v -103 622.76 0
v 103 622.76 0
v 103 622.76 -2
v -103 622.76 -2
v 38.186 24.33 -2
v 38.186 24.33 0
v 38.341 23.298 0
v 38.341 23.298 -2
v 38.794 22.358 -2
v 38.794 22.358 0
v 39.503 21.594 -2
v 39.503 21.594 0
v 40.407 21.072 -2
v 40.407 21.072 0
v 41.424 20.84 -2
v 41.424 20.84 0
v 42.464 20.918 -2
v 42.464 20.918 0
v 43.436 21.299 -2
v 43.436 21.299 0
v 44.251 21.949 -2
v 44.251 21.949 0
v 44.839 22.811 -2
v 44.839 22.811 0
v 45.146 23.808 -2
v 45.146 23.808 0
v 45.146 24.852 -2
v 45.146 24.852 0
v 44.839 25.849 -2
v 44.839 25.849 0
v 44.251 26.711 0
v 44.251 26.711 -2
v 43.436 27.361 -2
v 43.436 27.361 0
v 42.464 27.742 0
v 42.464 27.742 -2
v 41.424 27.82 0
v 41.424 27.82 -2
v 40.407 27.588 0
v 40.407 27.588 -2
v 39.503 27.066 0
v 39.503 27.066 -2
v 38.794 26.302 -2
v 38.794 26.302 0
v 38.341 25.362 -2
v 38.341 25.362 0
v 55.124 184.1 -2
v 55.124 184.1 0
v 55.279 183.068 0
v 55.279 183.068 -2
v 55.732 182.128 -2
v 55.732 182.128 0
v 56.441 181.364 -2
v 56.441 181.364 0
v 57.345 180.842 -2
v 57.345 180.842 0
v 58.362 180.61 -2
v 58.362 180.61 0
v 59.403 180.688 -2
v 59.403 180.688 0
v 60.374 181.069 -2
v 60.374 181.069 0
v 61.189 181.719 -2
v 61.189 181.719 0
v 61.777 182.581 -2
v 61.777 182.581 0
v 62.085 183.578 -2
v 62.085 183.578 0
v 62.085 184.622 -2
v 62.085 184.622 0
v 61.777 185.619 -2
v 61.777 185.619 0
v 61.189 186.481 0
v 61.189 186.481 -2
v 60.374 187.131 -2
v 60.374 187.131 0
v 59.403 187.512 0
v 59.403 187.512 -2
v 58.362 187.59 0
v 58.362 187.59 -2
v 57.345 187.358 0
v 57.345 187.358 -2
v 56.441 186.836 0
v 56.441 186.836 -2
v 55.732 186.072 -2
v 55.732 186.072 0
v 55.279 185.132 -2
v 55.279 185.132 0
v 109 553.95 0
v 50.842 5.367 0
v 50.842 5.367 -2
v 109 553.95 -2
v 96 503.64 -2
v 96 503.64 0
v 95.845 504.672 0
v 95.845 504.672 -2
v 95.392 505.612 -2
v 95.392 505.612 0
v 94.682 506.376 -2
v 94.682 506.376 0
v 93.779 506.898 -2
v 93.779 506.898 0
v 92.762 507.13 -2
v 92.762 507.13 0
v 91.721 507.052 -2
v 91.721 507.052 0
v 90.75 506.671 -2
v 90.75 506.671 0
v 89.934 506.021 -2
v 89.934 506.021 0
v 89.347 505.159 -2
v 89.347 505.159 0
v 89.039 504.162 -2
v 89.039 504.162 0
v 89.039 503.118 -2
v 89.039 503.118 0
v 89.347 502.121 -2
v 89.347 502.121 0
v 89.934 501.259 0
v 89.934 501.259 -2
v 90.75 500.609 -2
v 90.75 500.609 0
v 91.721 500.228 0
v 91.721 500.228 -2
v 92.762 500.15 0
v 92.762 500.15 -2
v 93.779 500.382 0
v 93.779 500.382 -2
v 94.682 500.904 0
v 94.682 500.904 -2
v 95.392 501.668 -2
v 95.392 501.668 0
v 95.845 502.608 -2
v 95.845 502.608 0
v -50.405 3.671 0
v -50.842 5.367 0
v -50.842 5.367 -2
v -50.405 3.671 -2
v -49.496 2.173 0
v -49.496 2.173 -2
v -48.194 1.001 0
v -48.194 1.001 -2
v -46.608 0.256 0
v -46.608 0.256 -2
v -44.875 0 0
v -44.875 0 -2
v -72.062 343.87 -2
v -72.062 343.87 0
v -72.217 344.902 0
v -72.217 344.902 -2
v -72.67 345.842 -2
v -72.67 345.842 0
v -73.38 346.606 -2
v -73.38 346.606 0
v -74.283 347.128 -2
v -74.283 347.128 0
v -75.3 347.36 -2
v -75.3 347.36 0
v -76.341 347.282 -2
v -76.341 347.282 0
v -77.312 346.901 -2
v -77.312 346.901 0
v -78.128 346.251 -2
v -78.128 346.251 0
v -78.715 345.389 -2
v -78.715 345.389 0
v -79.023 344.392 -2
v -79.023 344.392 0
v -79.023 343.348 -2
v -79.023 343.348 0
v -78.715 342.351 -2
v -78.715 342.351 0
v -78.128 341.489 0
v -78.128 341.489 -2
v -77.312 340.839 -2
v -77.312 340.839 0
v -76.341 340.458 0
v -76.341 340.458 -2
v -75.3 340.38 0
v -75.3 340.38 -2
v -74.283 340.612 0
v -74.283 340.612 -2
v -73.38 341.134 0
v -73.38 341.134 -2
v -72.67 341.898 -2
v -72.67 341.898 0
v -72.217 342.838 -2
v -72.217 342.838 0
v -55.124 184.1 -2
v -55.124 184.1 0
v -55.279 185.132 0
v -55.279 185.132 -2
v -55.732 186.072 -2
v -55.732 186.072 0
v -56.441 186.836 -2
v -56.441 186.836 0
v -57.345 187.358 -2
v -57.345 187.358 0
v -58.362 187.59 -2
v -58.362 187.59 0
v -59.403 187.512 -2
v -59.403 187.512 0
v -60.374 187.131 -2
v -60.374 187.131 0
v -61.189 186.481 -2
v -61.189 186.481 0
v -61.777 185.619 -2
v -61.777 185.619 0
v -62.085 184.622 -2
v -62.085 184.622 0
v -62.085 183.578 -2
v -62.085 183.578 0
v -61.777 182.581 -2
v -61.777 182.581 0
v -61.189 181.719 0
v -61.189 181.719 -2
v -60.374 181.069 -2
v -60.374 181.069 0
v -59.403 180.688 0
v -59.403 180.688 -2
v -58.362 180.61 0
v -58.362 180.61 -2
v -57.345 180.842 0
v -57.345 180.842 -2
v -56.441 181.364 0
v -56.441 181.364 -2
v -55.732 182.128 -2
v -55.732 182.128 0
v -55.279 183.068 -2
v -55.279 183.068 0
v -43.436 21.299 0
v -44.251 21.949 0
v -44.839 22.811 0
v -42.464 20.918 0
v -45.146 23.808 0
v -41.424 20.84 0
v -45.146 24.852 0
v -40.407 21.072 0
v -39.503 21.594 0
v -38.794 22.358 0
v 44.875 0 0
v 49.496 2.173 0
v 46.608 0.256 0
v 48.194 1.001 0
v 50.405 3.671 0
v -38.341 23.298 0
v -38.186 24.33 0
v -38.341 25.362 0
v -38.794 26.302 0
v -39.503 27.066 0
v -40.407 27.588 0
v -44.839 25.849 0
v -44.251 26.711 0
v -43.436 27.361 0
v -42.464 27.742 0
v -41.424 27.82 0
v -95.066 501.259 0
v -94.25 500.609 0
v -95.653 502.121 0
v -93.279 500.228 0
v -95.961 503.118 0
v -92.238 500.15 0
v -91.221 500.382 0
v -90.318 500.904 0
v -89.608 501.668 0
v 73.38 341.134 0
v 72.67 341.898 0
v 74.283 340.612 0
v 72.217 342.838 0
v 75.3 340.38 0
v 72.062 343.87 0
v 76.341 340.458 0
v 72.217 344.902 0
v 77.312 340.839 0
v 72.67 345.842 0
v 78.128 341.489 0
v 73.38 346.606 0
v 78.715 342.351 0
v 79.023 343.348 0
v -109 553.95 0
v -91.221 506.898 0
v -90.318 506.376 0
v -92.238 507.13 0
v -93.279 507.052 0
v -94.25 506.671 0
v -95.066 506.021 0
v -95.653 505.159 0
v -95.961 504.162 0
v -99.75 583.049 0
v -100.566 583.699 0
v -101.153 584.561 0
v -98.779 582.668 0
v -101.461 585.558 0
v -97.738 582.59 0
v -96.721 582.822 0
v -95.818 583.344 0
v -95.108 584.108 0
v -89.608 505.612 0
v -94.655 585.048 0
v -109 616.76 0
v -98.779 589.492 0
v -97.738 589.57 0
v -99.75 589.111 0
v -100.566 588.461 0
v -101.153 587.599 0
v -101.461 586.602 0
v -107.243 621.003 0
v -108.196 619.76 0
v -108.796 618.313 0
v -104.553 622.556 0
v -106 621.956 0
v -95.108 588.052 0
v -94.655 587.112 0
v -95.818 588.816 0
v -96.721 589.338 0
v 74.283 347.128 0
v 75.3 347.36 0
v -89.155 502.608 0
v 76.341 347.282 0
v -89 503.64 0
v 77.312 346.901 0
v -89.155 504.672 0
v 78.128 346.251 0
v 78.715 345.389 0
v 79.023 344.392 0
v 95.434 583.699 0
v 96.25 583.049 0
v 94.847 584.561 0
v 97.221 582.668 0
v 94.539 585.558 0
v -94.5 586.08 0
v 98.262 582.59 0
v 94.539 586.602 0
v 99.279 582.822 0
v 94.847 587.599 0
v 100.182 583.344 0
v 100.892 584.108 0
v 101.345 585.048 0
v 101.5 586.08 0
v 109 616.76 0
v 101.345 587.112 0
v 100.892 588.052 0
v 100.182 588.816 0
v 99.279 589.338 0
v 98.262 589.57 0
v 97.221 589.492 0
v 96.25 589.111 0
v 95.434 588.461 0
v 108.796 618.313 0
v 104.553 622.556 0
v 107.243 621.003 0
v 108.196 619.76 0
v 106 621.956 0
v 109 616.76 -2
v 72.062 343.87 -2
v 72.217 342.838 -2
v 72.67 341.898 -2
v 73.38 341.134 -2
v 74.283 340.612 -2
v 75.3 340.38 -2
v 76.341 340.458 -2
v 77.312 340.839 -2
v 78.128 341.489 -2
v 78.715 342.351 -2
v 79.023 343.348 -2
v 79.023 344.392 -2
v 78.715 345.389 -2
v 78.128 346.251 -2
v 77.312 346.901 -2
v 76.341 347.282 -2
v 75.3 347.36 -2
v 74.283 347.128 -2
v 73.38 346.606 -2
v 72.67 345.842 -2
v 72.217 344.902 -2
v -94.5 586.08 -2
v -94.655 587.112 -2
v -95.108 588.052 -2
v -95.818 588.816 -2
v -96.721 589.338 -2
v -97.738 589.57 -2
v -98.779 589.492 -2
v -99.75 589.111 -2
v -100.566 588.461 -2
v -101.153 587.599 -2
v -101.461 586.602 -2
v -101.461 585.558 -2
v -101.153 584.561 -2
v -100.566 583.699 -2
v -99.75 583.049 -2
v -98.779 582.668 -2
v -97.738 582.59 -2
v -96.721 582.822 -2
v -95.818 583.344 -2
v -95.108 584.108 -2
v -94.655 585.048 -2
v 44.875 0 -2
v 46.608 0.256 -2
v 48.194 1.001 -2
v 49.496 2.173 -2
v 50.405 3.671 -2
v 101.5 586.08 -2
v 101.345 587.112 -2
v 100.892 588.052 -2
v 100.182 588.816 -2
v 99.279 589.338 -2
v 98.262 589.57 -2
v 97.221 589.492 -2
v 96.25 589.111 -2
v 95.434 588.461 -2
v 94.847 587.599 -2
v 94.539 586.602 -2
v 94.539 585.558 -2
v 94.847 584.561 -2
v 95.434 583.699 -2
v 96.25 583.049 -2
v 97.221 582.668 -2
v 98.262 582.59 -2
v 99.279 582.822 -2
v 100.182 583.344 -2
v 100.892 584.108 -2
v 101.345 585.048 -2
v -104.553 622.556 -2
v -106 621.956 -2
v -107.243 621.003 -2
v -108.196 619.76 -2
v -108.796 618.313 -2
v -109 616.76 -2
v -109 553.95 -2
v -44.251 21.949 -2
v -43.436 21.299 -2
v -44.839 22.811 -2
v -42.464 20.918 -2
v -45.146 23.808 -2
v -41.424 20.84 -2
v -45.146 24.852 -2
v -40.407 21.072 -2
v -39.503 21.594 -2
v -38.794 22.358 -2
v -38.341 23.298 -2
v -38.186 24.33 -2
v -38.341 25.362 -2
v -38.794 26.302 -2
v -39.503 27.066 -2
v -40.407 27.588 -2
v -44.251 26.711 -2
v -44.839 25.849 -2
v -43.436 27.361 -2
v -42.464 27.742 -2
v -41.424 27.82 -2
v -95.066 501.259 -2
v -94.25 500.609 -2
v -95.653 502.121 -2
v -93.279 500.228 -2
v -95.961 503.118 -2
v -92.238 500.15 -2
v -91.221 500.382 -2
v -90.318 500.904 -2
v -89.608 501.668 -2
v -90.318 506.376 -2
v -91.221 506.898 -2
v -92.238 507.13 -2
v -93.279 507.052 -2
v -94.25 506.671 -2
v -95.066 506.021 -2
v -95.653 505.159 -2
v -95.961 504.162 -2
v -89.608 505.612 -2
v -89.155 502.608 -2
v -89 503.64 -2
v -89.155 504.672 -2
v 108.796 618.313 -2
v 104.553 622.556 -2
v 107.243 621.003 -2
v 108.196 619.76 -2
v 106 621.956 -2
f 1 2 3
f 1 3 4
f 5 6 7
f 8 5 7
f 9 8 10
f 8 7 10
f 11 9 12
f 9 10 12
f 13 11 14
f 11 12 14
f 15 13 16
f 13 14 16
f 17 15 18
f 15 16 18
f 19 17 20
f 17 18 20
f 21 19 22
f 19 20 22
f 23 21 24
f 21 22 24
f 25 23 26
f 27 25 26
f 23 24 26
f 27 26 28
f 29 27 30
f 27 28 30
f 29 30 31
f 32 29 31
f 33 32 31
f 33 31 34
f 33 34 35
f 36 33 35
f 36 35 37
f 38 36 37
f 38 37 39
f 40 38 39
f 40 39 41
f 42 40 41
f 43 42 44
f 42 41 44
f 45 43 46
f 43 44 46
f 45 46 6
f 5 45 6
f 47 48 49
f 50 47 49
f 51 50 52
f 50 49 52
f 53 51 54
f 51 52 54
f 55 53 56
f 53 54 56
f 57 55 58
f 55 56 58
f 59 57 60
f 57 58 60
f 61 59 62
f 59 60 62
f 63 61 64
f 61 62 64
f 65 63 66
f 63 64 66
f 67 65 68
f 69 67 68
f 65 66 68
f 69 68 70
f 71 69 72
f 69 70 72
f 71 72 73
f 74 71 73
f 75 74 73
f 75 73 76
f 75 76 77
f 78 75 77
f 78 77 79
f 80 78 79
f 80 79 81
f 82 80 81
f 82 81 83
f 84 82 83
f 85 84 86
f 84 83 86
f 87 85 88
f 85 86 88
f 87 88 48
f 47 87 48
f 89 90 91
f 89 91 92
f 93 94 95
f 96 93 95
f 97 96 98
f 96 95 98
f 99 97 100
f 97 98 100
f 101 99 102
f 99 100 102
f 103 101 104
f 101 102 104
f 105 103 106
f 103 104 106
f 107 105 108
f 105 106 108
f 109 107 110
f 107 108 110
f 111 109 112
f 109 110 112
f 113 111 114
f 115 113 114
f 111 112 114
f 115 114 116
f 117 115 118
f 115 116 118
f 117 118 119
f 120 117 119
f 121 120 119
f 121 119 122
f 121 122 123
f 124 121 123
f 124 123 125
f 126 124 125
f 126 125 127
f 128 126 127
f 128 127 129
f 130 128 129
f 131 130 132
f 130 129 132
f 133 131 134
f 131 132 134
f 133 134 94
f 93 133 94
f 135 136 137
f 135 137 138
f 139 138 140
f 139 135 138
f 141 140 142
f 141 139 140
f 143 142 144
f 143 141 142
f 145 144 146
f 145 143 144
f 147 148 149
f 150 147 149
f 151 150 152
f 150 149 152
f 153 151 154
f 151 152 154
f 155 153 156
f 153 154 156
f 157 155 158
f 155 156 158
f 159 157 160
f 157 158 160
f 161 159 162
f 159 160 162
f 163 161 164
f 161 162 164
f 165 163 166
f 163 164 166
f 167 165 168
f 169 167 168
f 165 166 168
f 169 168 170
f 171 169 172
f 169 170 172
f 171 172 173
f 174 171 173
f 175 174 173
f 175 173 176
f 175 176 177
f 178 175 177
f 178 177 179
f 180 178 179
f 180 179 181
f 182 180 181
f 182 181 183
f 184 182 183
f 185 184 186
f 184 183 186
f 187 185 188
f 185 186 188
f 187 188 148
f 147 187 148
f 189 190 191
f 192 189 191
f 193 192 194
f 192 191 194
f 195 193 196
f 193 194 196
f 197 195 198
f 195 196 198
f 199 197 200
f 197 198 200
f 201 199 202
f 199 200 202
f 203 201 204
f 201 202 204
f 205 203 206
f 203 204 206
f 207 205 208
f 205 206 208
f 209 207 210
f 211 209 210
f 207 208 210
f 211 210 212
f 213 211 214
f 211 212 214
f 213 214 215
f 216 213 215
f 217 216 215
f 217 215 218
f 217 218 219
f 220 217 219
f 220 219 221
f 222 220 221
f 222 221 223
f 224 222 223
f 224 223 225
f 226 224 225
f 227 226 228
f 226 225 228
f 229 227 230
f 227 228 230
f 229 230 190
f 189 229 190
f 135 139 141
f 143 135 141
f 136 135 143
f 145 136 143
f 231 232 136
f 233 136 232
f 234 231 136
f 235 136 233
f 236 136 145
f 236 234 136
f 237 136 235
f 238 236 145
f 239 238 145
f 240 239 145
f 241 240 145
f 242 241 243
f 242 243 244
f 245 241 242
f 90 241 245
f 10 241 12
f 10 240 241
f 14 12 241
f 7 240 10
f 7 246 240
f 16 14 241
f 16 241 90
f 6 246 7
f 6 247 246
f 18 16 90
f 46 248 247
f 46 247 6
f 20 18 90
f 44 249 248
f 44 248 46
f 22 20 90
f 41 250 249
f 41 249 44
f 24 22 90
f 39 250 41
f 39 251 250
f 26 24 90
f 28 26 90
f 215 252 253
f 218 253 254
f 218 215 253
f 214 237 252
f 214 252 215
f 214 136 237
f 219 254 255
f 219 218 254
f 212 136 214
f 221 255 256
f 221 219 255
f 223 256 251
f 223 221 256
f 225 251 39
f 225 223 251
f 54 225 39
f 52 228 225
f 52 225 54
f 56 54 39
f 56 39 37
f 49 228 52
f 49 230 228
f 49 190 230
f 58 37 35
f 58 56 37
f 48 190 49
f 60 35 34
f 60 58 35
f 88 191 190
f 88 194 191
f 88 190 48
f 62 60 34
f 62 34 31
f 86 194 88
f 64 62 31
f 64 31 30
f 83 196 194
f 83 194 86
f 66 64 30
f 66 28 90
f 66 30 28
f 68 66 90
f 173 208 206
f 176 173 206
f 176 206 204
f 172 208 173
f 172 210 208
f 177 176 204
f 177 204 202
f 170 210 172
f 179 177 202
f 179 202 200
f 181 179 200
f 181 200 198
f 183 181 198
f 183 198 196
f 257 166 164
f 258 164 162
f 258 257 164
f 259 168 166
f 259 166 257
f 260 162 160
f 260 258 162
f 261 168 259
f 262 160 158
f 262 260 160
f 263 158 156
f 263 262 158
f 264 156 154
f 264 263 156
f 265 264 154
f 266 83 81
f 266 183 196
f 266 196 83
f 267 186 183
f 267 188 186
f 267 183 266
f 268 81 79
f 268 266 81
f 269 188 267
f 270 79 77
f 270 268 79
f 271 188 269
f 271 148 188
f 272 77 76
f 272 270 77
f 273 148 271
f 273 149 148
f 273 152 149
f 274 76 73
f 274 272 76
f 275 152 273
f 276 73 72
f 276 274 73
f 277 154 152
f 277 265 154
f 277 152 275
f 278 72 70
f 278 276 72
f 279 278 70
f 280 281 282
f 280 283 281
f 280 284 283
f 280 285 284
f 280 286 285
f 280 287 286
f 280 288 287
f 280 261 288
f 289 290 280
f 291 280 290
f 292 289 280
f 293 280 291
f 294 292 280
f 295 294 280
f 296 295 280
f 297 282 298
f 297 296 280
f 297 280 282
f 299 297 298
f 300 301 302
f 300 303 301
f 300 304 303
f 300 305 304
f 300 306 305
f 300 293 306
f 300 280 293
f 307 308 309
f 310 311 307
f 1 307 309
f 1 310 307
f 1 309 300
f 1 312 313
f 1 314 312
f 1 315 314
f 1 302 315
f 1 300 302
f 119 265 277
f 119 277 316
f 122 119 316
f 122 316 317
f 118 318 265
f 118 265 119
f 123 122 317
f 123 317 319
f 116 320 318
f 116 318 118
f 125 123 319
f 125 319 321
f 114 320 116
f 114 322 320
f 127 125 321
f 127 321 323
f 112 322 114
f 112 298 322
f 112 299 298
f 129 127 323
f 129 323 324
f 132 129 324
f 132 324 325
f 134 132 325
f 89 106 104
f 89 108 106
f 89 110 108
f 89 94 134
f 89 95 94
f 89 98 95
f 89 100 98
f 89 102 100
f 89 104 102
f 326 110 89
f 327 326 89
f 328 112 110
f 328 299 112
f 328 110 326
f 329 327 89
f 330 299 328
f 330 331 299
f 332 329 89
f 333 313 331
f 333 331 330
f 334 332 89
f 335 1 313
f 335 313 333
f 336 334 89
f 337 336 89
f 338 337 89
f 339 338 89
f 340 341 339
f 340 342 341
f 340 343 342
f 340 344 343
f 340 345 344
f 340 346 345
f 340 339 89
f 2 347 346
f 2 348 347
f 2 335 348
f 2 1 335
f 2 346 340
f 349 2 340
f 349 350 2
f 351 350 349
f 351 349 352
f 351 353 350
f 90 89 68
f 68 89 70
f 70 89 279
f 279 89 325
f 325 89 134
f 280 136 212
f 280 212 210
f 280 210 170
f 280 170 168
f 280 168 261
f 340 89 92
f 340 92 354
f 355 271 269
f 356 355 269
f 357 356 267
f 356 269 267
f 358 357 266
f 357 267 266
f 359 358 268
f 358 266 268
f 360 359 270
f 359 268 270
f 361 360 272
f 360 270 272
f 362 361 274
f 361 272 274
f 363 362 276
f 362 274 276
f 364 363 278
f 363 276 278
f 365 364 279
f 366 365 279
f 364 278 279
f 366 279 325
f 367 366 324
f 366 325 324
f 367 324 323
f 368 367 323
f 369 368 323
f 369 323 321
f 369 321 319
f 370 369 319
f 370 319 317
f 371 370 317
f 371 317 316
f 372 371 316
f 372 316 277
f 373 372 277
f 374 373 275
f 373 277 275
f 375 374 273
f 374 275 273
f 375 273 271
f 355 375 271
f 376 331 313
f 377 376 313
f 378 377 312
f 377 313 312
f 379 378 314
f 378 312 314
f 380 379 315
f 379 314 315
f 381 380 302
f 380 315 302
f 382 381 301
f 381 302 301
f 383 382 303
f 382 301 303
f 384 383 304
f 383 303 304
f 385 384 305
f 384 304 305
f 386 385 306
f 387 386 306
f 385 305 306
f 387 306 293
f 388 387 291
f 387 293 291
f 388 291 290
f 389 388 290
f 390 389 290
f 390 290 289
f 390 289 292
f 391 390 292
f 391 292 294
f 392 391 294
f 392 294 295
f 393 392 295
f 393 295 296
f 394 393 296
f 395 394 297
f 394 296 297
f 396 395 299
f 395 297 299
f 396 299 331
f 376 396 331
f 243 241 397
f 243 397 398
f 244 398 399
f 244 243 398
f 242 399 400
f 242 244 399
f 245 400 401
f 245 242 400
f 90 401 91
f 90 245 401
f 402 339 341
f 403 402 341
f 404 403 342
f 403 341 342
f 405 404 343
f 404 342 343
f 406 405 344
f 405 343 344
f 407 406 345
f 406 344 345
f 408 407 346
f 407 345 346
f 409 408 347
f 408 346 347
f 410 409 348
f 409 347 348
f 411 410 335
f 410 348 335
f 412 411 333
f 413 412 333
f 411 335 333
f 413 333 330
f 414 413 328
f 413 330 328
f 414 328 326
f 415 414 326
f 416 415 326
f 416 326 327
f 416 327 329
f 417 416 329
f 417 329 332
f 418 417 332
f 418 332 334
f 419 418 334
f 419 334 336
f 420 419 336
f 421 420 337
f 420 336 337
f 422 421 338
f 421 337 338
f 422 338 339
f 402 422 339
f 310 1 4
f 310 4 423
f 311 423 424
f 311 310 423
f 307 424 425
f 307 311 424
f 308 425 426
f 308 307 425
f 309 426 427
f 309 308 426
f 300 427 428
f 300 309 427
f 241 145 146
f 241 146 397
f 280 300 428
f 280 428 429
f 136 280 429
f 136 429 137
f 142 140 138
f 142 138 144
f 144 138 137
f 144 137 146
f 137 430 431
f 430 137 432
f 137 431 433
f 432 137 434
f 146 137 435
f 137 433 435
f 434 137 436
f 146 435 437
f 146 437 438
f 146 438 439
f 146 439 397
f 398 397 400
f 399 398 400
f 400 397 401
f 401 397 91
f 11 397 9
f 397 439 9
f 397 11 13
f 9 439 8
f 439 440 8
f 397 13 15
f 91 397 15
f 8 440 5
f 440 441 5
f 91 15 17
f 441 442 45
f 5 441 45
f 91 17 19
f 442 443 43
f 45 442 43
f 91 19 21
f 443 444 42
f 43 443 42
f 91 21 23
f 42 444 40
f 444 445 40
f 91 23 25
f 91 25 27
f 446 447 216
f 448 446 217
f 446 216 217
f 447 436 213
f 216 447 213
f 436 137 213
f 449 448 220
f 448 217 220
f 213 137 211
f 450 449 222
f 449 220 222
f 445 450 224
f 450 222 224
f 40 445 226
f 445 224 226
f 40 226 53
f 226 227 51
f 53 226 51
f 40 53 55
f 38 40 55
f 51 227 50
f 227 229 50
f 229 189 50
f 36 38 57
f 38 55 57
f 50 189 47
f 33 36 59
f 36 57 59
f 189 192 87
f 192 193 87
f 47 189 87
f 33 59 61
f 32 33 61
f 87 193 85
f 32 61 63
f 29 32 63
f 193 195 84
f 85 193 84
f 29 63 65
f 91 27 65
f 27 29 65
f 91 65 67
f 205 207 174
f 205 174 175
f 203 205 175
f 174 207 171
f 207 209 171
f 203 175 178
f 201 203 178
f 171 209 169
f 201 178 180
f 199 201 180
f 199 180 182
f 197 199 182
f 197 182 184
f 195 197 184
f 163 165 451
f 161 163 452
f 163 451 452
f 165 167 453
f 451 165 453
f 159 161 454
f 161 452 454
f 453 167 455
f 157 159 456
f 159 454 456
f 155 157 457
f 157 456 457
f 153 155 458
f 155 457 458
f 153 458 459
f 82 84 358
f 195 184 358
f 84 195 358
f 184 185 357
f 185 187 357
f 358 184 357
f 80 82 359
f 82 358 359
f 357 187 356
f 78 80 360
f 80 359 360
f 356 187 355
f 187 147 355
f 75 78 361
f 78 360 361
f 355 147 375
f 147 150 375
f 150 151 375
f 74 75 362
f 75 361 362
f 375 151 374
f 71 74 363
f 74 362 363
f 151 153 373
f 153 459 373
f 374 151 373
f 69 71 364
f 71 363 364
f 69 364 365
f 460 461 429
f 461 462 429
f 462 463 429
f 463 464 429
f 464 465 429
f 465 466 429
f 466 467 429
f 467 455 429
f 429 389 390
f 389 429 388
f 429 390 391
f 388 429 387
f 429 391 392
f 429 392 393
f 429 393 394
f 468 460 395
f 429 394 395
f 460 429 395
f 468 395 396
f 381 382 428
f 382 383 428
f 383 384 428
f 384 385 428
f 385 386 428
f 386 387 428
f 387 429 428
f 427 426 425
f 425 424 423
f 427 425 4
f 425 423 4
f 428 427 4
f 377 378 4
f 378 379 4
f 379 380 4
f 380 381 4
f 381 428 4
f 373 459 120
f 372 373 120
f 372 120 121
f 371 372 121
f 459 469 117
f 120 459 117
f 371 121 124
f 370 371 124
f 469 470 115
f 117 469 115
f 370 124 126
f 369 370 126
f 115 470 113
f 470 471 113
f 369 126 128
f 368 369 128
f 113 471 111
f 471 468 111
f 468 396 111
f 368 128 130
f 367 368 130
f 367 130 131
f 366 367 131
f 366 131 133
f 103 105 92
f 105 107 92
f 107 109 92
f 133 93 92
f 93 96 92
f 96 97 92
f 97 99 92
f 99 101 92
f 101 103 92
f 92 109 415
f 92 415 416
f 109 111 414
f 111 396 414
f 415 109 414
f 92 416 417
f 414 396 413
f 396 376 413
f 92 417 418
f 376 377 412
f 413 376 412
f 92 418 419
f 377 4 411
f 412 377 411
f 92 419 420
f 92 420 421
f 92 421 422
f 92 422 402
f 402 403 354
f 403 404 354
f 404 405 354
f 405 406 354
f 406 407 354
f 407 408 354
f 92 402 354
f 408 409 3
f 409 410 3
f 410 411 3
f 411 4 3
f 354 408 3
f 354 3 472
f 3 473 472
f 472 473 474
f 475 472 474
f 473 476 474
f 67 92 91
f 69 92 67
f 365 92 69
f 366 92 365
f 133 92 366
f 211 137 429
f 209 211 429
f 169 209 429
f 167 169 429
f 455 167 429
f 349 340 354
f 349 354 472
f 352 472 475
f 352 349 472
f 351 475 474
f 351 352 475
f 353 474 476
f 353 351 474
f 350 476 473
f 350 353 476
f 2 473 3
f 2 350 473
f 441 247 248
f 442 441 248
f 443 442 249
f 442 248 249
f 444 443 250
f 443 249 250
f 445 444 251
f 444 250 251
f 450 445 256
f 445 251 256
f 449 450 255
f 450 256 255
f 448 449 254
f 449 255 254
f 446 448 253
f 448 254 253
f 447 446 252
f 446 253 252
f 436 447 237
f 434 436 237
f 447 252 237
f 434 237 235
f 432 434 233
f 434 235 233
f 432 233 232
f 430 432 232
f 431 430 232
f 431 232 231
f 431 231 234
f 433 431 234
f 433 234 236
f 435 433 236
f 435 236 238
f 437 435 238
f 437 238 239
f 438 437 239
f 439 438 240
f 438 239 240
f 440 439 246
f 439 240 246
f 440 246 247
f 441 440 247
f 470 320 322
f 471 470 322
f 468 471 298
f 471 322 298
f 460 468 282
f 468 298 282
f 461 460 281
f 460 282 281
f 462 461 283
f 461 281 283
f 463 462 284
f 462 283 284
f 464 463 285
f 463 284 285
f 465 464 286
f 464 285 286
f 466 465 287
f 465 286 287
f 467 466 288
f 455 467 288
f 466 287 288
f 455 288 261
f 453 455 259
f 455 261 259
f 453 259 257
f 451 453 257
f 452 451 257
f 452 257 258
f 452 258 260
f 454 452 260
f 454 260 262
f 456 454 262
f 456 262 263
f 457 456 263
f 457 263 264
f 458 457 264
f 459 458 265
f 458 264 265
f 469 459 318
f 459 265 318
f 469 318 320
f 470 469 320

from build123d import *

# Parameters (mm, degrees)
ESBO_O1_R          = 3.5
FLANGE_BASE1_DEPTH = 2


# Sheet-metal steps are written as plain solids
with BuildPart() as part:
    # Esboço1 → Flange-base1 (new body)
    with BuildSketch(Plane.XY):
        with BuildLine():
            Line((-44.875, 0), (44.875, 0))
            ThreePointArc((44.875, 0), (48.887773278, 1.539321731), (50.84156352, 5.367449793))
            Line((50.84156352, 5.367449793), (109, 553.95))
            Line((109, 553.95), (109, 616.76))
            ThreePointArc((109, 616.76), (107.242640687, 621.002640687), (103, 622.76))
            Line((103, 622.76), (-103, 622.76))
            ThreePointArc((-103, 622.76), (-107.242640687, 621.002640687), (-109, 616.76))
            Line((-109, 616.76), (-109, 553.95))
            Line((-109, 553.95), (-50.84156352, 5.367449793))
            ThreePointArc((-50.84156352, 5.367449793), (-48.887773278, 1.539321731), (-44.875, 0))
        make_face()
        with Locations((-98, 586.08)):
            Circle(ESBO_O1_R, mode=Mode.SUBTRACT)
        with Locations((98, 586.08)):
            Circle(ESBO_O1_R, mode=Mode.SUBTRACT)
        with Locations((-92.5, 503.64)):
            Circle(ESBO_O1_R, mode=Mode.SUBTRACT)
        with Locations((92.5, 503.64)):
            Circle(ESBO_O1_R, mode=Mode.SUBTRACT)
        with Locations((-75.56185023, 343.87)):
            Circle(ESBO_O1_R, mode=Mode.SUBTRACT)
        with Locations((-58.623700461, 184.1)):
            Circle(ESBO_O1_R, mode=Mode.SUBTRACT)
        with Locations((-41.685550691, 24.33)):
            Circle(ESBO_O1_R, mode=Mode.SUBTRACT)
        with Locations(Location((41.685550691, 24.33, 0), (0, 0, 180))):
            Circle(ESBO_O1_R, mode=Mode.SUBTRACT)
        with Locations(Location((58.623700461, 184.1, 0), (0, 0, 180))):
            Circle(ESBO_O1_R, mode=Mode.SUBTRACT)
        with Locations(Location((75.56185023, 343.87, 0), (0, 0, 180))):
            Circle(ESBO_O1_R, mode=Mode.SUBTRACT)
    extrude(amount=-FLANGE_BASE1_DEPTH)


solid = part.part
